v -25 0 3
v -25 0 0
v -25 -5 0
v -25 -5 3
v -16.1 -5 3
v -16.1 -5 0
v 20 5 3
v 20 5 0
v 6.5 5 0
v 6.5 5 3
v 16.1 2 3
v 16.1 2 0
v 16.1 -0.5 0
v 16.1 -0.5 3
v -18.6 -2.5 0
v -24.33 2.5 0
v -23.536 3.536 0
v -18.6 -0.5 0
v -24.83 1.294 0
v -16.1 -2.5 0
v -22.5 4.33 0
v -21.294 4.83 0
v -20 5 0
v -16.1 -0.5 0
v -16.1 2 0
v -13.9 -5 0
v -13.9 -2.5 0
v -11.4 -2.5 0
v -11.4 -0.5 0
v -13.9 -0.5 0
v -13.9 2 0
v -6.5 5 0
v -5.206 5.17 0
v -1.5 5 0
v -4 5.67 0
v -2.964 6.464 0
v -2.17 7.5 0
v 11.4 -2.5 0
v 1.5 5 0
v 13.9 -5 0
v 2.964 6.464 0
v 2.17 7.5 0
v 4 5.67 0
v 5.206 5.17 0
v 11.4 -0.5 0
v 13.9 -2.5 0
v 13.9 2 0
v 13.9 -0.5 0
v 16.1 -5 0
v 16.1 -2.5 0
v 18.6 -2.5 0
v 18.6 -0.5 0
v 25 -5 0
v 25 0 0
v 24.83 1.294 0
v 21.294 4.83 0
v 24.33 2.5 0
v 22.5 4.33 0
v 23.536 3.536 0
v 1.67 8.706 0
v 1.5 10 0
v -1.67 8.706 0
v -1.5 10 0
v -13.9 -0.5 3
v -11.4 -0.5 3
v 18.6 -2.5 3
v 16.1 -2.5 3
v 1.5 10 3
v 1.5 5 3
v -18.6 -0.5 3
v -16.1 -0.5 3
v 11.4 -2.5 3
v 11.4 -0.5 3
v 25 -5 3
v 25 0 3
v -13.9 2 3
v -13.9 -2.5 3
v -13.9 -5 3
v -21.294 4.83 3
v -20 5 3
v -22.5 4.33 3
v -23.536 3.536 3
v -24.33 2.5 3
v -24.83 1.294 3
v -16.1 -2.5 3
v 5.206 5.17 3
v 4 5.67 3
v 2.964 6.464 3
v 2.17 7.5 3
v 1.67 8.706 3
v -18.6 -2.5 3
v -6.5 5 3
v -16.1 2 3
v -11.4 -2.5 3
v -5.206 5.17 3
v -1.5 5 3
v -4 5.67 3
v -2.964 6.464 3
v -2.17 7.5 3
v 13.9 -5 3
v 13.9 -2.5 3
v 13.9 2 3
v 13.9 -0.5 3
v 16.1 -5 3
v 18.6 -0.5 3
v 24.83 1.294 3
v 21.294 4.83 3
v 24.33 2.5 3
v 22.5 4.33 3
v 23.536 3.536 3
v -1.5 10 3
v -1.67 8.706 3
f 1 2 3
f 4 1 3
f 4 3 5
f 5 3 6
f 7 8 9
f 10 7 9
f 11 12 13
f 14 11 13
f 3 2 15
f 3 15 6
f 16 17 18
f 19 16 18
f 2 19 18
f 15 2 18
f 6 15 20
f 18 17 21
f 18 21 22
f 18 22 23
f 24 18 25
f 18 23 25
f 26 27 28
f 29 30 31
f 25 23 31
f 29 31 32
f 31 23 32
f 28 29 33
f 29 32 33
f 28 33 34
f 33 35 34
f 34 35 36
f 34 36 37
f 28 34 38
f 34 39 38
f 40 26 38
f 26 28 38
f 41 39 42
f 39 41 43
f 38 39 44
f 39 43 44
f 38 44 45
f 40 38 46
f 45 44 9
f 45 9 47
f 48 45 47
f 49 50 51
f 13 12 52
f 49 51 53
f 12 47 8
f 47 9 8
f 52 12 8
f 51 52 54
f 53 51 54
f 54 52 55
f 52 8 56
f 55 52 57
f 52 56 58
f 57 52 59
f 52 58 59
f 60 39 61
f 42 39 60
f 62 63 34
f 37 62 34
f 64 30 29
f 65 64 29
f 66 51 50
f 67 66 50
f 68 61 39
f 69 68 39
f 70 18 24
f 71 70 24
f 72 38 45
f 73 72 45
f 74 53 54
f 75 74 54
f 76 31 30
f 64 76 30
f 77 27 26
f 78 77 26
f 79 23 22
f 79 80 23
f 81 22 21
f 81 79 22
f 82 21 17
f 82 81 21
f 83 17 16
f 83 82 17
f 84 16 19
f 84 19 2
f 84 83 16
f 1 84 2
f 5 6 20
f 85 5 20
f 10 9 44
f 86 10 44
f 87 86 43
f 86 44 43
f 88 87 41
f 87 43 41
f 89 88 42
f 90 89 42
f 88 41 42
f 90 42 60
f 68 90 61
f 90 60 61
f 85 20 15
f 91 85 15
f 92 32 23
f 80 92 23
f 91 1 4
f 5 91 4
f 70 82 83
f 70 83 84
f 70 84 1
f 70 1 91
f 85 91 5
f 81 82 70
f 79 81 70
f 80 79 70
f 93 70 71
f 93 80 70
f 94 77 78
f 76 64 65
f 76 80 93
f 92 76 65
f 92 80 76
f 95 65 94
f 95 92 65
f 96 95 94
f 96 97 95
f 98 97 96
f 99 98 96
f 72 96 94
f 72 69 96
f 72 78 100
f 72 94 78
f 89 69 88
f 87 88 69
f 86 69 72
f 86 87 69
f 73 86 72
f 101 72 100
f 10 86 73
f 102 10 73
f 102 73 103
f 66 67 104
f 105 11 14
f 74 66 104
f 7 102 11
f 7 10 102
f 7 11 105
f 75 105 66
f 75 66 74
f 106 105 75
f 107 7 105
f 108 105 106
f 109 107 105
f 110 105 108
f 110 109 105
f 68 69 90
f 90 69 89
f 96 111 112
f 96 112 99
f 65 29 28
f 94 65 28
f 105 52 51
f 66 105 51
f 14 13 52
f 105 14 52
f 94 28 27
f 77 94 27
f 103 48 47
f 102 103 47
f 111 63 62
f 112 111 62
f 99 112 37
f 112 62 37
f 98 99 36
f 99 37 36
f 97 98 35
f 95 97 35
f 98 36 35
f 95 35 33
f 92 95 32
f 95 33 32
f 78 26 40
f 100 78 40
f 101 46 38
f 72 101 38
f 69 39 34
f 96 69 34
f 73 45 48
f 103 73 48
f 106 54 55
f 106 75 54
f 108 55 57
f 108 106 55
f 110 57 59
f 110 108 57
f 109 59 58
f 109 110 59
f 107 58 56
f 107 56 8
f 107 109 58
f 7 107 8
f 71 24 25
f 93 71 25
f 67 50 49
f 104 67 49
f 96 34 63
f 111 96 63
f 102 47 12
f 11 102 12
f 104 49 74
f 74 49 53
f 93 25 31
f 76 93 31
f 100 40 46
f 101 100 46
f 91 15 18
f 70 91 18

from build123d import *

# Parameters (mm, degrees)
BOSS_EXTRUDE1_DEPTH = 3
FILLET1_R           = 5


with BuildPart() as part:
    # Sketch1 → Boss-Extrude1 (new body)
    with BuildSketch(Plane.XY):
        with BuildLine():
            Line((-25, -5), (-16.1, -5))
            Line((-16.1, -5), (-16.1, -2.5))
            Line((-16.1, -2.5), (-18.6, -2.5))
            Line((-18.6, -2.5), (-18.6, -0.5))
            Line((-18.6, -0.5), (-16.1, -0.5))
            Line((-16.1, -0.5), (-16.1, 2))
            Line((-16.1, 2), (-13.9, 2))
            Line((-13.9, 2), (-13.9, -0.5))
            Line((-13.9, -0.5), (-11.4, -0.5))
            Line((-11.4, -0.5), (-11.4, -2.5))
            Line((-11.4, -2.5), (-13.9, -2.5))
            Line((-13.9, -2.5), (-13.9, -5))
            Line((-13.9, -5), (13.9, -5))
            Line((13.9, -5), (13.9, -2.5))
            Line((13.9, -2.5), (11.4, -2.5))
            Line((11.4, -2.5), (11.4, -0.5))
            Line((11.4, -0.5), (13.9, -0.5))
            Line((13.9, -0.5), (13.9, 2))
            Line((13.9, 2), (16.1, 2))
            Line((16.1, 2), (16.1, -0.5))
            Line((16.1, -0.5), (18.6, -0.5))
            Line((18.6, -0.5), (18.6, -2.5))
            Line((18.6, -2.5), (16.1, -2.5))
            Line((16.1, -2.5), (16.1, -5))
            Line((16.1, -5), (25, -5))
            Line((25, -5), (25, 5))
            Line((25, 5), (6.5, 5))
            ThreePointArc((6.5, 5), (2.964466094, 6.464466094), (1.5, 10))
            Line((1.5, 10), (1.5, 5))
            Line((1.5, 5), (-1.5, 5))
            Line((-1.5, 5), (-1.5, 10))
            ThreePointArc((-1.5, 10), (-2.964466094, 6.464466094), (-6.5, 5))
            Line((-6.5, 5), (-25, 5))
            Line((-25, 5), (-25, -5))
        make_face()
    extrude(amount=BOSS_EXTRUDE1_DEPTH)

    # Fillet1
    fillet1_edges = [part.edges().sort_by_distance(p)[0] for p in [
        (25, 5, 1.5),
        (-25, 5, 1.5),
    ]]
    fillet(fillet1_edges, radius=FILLET1_R)


solid = part.part
